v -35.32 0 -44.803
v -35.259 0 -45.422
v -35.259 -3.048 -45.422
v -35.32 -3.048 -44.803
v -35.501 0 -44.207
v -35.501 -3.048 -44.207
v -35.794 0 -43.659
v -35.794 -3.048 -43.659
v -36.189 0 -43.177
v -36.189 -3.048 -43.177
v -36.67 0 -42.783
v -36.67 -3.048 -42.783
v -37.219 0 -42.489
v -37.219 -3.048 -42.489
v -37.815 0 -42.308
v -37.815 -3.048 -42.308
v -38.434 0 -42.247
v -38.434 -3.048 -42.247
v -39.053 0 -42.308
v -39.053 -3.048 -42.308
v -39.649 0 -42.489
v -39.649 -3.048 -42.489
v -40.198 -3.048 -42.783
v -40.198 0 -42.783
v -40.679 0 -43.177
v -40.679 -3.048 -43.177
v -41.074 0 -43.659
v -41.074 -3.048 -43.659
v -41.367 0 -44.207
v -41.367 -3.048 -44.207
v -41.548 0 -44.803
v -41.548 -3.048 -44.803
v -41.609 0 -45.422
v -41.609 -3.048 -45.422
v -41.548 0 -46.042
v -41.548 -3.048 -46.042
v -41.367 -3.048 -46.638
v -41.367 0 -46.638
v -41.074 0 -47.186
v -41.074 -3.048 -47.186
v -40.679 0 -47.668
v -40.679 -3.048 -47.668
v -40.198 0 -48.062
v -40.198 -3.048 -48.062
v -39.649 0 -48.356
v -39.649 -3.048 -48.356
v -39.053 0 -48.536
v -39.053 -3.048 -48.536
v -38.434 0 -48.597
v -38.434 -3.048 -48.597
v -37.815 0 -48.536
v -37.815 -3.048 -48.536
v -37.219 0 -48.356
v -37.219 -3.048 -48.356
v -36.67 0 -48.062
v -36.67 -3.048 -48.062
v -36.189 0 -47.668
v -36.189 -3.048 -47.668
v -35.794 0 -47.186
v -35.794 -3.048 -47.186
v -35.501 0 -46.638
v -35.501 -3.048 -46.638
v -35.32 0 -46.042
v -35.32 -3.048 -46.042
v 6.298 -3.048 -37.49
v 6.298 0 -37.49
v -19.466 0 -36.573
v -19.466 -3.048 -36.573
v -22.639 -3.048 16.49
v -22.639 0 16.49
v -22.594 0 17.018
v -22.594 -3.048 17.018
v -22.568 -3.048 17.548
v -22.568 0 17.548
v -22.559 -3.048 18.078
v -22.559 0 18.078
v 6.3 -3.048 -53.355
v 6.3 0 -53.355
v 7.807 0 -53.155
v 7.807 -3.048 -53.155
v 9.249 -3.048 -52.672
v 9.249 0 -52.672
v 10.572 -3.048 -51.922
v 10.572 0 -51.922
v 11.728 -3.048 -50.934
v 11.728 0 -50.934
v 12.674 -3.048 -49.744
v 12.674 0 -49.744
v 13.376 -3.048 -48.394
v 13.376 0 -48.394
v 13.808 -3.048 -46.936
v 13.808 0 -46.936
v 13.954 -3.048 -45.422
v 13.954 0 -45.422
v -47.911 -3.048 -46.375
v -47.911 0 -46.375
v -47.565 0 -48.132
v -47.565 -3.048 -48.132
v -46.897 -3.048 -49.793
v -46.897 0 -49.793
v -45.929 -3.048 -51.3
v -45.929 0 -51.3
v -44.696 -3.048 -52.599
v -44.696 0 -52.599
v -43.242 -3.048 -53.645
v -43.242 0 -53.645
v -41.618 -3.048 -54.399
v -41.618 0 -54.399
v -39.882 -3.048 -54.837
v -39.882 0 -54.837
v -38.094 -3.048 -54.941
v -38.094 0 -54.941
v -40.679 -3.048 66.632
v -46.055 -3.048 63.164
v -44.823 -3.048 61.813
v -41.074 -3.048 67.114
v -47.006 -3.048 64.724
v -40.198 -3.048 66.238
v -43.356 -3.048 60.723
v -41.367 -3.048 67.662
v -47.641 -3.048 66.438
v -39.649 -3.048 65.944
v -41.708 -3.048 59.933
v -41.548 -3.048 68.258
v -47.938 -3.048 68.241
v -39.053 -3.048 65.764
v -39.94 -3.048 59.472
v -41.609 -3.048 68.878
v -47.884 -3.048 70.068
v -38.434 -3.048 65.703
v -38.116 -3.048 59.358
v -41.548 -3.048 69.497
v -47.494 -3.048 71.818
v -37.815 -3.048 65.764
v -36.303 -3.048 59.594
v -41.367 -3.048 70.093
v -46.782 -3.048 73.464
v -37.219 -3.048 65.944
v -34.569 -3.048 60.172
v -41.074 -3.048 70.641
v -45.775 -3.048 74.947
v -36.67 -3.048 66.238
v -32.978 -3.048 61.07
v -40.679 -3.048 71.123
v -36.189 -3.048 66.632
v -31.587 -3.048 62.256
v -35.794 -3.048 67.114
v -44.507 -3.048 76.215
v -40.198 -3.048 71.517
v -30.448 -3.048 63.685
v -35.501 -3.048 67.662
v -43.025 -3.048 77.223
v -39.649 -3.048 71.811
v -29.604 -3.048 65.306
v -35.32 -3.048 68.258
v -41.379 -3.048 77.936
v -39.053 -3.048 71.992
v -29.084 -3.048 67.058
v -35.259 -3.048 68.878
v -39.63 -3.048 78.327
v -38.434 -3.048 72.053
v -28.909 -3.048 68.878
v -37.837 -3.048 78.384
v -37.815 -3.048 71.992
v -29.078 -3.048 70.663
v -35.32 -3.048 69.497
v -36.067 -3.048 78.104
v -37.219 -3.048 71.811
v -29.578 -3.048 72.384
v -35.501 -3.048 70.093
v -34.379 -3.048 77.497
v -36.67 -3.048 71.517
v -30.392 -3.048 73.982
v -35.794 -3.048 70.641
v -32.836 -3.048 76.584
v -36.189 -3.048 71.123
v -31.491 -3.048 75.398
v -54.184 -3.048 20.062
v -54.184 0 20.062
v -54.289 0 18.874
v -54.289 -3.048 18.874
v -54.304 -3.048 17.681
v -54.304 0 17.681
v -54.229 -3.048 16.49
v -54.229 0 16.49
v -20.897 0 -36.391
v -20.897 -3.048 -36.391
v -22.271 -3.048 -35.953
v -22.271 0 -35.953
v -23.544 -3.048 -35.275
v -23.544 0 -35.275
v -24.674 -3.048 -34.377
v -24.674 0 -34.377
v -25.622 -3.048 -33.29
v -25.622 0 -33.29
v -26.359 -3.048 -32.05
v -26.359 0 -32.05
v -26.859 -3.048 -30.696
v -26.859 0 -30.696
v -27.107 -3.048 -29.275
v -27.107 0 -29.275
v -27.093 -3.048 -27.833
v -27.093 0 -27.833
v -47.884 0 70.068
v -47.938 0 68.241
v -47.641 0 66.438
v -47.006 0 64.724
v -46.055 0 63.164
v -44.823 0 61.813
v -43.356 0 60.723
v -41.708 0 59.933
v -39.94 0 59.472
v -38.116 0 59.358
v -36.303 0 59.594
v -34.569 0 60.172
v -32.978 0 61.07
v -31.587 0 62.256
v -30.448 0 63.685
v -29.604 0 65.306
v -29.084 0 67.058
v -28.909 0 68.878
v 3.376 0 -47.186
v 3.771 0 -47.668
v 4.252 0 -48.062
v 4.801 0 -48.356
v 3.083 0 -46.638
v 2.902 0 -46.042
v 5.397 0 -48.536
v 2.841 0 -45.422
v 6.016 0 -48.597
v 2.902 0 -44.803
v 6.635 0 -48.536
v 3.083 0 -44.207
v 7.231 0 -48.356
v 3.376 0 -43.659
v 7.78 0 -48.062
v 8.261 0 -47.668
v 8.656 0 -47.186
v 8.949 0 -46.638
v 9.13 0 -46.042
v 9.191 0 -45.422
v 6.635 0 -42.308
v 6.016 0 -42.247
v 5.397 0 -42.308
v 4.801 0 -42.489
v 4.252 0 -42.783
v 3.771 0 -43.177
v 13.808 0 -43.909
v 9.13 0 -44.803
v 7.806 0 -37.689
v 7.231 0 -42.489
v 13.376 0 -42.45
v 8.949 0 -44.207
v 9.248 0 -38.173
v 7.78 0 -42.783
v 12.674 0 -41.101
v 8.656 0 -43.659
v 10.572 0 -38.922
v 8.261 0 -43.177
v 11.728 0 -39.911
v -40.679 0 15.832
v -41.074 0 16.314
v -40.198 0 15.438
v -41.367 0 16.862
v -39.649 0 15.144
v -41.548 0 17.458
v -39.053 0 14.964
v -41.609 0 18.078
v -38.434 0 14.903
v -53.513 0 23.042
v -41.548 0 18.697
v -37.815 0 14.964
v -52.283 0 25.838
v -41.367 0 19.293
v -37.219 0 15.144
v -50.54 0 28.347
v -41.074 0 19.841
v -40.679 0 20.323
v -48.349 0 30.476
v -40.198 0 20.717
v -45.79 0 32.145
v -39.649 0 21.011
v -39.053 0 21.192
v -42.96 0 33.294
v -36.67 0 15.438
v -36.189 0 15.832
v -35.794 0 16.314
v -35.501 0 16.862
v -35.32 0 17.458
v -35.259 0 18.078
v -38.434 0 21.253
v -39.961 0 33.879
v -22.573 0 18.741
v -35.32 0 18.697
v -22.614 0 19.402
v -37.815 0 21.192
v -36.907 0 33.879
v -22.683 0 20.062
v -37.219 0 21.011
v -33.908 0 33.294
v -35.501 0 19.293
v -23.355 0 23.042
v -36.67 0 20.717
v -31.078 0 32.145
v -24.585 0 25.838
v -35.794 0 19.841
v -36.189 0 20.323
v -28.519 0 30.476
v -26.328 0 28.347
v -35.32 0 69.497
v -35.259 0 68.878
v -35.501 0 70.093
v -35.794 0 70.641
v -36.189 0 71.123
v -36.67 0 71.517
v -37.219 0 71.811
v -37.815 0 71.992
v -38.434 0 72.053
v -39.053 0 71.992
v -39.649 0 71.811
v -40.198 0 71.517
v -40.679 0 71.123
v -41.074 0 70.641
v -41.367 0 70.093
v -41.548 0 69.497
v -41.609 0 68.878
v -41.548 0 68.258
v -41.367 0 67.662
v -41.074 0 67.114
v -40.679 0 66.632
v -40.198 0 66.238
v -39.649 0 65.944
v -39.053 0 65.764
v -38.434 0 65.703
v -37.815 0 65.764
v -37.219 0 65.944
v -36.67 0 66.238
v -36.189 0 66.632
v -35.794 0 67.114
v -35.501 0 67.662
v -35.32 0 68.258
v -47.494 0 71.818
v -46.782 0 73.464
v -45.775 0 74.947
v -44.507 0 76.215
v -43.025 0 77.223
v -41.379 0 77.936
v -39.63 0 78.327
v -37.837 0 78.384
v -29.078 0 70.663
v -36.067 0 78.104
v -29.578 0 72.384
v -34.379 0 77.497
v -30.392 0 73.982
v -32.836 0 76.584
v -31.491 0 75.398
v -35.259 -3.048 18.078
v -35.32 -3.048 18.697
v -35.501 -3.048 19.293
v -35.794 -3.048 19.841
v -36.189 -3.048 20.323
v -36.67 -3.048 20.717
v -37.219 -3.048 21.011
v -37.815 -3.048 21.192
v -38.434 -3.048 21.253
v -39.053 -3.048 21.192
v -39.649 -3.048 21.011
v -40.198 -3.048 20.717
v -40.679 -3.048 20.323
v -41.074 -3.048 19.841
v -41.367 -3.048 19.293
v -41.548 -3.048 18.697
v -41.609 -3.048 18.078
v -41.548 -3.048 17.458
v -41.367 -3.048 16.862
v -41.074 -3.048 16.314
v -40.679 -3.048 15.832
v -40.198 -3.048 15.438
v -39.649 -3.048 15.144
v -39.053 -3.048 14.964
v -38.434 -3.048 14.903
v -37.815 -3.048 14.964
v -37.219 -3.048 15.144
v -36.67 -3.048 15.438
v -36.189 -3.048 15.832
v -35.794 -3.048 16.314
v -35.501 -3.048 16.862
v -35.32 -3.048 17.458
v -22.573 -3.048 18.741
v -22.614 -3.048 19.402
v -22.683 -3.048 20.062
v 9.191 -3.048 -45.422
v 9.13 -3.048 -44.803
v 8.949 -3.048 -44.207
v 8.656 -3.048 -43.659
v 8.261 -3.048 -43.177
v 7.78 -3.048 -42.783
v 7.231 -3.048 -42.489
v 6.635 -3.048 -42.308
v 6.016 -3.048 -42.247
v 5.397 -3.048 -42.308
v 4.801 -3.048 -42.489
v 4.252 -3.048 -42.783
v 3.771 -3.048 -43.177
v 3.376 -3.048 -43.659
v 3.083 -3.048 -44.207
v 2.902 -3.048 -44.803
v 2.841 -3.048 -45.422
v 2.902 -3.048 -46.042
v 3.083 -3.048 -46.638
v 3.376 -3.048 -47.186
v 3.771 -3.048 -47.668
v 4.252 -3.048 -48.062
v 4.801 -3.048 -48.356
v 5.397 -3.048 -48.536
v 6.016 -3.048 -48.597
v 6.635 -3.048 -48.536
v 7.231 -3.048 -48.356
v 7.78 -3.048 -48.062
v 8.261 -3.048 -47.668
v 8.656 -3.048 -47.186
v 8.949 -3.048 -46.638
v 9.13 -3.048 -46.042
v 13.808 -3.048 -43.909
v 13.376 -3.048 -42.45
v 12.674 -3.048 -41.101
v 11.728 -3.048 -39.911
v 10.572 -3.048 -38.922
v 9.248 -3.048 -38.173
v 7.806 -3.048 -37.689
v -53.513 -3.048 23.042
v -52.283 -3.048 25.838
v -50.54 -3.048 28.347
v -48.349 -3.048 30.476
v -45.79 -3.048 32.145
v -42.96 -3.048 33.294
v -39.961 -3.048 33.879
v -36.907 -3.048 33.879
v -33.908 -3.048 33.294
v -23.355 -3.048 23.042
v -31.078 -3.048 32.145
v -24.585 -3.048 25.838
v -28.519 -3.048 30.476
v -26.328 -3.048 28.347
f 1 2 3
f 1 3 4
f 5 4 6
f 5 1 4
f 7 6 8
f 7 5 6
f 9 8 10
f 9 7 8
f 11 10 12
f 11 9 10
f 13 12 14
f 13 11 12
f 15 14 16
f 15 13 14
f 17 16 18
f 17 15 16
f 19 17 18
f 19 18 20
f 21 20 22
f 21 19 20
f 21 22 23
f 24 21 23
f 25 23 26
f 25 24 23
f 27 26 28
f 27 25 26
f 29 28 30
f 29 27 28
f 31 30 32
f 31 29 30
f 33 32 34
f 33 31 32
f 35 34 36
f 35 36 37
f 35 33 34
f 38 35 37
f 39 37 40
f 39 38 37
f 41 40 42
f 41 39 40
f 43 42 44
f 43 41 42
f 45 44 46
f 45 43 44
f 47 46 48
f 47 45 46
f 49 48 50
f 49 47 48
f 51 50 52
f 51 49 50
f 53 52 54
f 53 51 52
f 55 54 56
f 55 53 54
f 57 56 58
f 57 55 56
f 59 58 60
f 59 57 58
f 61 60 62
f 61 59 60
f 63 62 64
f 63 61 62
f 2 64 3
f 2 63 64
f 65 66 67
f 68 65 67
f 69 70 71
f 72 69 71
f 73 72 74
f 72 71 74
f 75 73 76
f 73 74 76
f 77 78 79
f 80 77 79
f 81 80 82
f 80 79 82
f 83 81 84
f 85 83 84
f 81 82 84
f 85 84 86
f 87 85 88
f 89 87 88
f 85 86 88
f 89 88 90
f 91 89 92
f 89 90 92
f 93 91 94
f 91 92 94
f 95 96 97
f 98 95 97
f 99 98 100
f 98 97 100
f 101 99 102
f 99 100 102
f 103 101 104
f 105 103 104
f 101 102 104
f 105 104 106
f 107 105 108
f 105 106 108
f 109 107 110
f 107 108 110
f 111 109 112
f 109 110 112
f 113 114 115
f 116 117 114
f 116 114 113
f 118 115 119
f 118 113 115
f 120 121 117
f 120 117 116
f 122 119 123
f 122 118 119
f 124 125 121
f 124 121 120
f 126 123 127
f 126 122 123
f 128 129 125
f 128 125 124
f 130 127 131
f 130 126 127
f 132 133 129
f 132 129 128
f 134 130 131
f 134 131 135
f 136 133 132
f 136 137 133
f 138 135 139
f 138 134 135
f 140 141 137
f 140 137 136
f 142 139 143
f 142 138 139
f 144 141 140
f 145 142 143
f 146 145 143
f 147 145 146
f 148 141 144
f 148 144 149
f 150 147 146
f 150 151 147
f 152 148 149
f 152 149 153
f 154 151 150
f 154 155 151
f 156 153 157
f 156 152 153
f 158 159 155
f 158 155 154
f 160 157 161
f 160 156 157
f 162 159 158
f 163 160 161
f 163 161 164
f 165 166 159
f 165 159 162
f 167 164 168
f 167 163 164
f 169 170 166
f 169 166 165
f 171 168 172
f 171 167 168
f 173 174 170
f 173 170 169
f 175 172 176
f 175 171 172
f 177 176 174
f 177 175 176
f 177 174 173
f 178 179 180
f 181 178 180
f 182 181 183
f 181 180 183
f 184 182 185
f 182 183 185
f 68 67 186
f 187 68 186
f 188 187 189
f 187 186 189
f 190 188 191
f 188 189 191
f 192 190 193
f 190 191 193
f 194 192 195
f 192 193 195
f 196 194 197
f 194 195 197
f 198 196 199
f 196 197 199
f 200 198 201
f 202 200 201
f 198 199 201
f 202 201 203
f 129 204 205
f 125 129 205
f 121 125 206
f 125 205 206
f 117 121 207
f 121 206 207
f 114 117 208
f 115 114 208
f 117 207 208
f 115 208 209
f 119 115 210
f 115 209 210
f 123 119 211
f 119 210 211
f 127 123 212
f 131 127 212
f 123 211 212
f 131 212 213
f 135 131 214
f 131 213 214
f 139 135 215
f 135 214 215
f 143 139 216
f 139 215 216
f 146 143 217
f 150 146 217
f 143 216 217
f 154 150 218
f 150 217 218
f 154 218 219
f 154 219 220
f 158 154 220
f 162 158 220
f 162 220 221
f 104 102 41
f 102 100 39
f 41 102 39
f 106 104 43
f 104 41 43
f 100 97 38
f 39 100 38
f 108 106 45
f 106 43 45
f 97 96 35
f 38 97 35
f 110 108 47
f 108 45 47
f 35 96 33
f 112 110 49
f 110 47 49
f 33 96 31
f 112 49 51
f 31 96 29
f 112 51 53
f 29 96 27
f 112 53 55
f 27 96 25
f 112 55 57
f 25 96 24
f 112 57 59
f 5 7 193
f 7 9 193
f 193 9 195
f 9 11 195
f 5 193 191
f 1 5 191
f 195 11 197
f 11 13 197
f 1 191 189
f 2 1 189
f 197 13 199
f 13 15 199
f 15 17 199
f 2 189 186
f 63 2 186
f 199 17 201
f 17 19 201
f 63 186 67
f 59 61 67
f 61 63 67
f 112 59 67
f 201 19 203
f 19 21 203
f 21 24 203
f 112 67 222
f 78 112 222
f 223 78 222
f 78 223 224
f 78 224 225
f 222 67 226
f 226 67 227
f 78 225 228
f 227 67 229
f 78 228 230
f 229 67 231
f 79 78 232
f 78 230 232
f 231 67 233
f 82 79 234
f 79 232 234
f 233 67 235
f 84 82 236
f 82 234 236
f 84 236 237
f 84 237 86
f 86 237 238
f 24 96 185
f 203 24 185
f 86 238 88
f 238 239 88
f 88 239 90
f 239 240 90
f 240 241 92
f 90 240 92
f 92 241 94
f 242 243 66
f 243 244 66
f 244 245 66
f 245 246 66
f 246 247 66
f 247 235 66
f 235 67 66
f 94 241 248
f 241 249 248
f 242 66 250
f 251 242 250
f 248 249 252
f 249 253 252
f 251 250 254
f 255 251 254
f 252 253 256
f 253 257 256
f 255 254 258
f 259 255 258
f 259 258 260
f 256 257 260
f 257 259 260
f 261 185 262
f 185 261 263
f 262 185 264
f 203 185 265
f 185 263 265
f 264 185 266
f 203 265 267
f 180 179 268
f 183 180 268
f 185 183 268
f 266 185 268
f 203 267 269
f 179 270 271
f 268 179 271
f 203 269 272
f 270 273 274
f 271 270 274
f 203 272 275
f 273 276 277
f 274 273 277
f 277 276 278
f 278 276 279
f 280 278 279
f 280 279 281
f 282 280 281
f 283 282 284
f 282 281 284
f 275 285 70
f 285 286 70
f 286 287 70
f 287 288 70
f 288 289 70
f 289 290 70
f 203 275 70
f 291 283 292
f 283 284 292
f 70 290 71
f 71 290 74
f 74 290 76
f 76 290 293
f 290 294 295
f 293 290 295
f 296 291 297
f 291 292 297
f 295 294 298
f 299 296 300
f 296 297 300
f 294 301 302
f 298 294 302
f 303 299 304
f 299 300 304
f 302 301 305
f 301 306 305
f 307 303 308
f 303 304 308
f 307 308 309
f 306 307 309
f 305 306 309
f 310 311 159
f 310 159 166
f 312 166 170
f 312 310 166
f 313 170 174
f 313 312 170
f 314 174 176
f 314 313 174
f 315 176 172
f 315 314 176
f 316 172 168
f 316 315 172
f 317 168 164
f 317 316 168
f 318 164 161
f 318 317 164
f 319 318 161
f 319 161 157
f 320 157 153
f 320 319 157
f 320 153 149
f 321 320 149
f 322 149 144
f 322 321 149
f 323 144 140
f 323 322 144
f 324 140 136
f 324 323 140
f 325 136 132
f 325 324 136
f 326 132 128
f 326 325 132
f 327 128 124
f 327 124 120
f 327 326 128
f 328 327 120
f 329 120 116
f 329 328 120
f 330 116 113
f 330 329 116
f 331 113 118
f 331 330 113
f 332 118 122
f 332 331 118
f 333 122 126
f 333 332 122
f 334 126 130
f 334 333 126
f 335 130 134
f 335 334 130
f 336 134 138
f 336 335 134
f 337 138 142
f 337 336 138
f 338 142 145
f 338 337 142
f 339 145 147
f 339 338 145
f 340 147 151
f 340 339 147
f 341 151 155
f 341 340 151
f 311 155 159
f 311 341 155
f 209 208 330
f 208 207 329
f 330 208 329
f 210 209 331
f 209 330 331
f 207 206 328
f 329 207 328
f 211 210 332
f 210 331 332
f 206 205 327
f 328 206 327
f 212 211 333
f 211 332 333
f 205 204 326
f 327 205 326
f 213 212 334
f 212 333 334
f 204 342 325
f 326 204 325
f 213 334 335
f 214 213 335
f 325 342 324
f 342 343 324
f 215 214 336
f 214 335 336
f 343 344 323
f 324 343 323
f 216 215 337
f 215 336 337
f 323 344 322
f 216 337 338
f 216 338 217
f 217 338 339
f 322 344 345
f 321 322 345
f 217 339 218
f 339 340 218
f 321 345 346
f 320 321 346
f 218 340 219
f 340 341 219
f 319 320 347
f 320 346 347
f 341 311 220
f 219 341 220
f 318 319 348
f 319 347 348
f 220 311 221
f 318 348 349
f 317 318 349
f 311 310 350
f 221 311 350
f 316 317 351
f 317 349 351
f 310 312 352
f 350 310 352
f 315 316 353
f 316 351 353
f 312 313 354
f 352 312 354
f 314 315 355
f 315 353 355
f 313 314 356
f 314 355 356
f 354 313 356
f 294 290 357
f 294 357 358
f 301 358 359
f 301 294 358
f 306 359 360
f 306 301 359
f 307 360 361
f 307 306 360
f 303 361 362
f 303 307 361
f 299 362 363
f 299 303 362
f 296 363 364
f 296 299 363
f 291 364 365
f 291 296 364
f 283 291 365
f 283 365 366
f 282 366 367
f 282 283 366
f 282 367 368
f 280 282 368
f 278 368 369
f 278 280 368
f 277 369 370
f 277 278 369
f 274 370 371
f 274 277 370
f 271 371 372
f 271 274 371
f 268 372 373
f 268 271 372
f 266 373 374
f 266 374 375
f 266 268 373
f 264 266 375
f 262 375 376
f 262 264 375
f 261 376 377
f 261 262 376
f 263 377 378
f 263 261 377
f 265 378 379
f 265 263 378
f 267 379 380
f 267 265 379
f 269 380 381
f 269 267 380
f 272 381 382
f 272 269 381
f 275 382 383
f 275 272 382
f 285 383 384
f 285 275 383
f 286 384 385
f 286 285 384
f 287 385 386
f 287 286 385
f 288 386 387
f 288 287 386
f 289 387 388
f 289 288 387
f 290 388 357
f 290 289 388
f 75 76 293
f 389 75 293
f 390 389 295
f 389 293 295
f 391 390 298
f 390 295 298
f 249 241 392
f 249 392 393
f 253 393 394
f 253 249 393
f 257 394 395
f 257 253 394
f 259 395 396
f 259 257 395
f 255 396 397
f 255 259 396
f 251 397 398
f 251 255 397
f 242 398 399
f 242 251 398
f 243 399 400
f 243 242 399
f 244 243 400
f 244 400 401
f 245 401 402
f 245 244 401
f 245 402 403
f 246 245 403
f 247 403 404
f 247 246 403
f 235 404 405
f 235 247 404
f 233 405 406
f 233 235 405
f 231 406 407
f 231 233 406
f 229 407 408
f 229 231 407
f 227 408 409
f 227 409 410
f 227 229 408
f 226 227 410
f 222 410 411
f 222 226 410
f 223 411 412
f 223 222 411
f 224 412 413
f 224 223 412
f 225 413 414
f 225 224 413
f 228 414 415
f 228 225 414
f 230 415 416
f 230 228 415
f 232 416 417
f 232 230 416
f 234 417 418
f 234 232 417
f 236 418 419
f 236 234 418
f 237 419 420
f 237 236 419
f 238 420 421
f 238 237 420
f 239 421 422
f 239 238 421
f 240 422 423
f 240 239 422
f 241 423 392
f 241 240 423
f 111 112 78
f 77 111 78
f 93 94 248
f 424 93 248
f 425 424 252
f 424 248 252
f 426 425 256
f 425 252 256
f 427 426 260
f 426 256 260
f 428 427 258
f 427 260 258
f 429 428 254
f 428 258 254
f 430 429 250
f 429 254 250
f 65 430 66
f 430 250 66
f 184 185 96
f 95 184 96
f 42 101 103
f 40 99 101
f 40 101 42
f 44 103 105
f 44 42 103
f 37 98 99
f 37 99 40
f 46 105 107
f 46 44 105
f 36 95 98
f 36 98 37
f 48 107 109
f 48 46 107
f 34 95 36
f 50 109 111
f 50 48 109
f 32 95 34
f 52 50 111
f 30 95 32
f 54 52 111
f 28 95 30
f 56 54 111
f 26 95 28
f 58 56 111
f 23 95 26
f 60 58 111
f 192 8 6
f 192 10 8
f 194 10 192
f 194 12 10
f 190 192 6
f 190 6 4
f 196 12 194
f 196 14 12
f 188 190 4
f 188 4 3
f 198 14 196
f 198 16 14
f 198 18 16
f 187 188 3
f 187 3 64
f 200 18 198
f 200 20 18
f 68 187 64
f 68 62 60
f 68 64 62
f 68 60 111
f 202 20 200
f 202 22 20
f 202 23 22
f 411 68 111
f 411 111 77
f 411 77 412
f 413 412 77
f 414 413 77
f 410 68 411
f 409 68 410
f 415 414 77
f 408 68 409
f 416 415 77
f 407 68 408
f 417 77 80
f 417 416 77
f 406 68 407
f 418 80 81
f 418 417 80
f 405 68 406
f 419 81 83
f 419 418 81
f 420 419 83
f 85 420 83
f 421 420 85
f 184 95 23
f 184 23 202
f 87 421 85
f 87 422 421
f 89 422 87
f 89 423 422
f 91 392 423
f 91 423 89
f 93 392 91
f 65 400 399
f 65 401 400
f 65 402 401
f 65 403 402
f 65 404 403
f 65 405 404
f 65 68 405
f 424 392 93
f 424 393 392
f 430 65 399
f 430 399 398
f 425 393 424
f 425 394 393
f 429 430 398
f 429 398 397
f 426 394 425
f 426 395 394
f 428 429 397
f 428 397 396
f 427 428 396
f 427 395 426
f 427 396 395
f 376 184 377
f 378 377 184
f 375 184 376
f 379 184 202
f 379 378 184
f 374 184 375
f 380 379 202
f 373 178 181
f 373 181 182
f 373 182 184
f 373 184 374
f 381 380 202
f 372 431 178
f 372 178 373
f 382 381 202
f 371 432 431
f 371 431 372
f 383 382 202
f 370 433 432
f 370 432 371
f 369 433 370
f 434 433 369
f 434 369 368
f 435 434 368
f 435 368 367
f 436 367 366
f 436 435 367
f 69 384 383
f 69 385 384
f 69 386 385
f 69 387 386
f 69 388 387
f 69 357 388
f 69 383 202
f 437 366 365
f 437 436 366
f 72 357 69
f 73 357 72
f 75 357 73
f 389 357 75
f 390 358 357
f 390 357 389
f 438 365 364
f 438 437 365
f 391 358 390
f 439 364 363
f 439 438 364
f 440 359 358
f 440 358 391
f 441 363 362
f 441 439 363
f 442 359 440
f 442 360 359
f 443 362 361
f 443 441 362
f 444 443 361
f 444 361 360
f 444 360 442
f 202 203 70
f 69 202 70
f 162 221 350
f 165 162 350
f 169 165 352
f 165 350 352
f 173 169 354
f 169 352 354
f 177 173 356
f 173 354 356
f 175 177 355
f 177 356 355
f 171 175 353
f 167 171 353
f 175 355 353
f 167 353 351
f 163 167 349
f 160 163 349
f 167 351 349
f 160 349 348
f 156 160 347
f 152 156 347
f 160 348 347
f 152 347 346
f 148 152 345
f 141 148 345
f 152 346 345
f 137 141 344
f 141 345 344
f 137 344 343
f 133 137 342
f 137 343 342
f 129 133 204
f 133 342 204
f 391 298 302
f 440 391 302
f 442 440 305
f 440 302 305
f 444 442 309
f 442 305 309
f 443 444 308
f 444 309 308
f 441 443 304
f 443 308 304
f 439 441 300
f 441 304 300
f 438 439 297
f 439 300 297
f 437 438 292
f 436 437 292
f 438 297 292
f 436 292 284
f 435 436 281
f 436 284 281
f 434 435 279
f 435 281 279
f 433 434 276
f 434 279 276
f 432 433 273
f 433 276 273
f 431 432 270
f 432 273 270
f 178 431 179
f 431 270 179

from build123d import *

# Parameters (mm, degrees)
F0_R     = 3.175
F1_DEPTH = 3.048


with BuildPart() as f1:
    # F0 (on Front) → F1 (new body)
    with BuildSketch(Plane.XZ):
        with BuildLine():
            ThreePointArc((-47.884236, 70.06814), (-39.030426, 59.371211), (-28.908943, 68.877515))
            ThreePointArc((-28.908943, 68.877515), (-37.83746, 78.38382), (-47.884236, 70.06814))
        make_face()
        with Locations((-38.433943, 68.877515)):
            Circle(F0_R, mode=Mode.SUBTRACT)
        with BuildLine():
            ThreePointArc((-22.683455, 20.06189), (-38.433943, 33.952515), (-54.184431, 20.06189))
            ThreePointArc((-54.184431, 20.06189), (-54.307687, 18.277221), (-54.229369, 16.490015))
            ThreePointArc((-54.229369, 16.490015), (-38.433943, 2.202515), (-22.638517, 16.490015))
            ThreePointArc((-22.638517, 16.490015), (-22.578849, 17.282769), (-22.558943, 18.077515))
            ThreePointArc((-22.558943, 18.077515), (-22.590101, 19.071654), (-22.683455, 20.06189))
        make_face()
        with Locations((-38.433943, 18.077515)):
            Circle(F0_R, mode=Mode.SUBTRACT)
        with BuildLine():
            ThreePointArc((-22.638517, 16.490015), (-38.433943, 2.202515), (-54.229369, 16.490015))
            Line((-54.229369, 16.490015), (-47.911198, -46.374985))
            ThreePointArc((-47.911198, -46.374985), (-38.910791, -35.909428), (-28.908943, -45.422485))
            ThreePointArc((-28.908943, -45.422485), (-31.579535, -52.036312), (-38.093764, -54.941408))
            Line((-38.093764, -54.941408), (6.299539, -53.354921))
            ThreePointArc((6.299539, -53.354921), (-1.921443, -45.423023), (6.298462, -37.49001))
            Line((6.298462, -37.49001), (-19.465615, -36.572779))
            ThreePointArc((-19.465615, -36.572779), (-25.172739, -33.855022), (-27.093107, -27.832592))
            Line((-27.093107, -27.832592), (-22.638517, 16.490015))
        make_face()
        with BuildLine():
            ThreePointArc((-28.908943, -45.422485), (-38.910791, -35.909428), (-47.911198, -46.374985))
            ThreePointArc((-47.911198, -46.374985), (-44.696326, -52.599404), (-38.093764, -54.941408))
            ThreePointArc((-38.093764, -54.941408), (-31.579535, -52.036312), (-28.908943, -45.422485))
        make_face()
        with Locations((-38.433943, -45.422485)):
            Circle(F0_R, mode=Mode.SUBTRACT)
        with BuildLine():
            ThreePointArc((6.298462, -37.49001), (-1.921443, -45.423023), (6.299539, -53.354921))
            ThreePointArc((6.299539, -53.354921), (11.728064, -50.934007), (13.953557, -45.422485))
            ThreePointArc((13.953557, -45.422485), (11.72769, -39.910574), (6.298462, -37.49001))
        make_face()
        with Locations((6.016057, -45.422485)):
            Circle(F0_R, mode=Mode.SUBTRACT)
    extrude(amount=F1_DEPTH)


solid = f1.part
